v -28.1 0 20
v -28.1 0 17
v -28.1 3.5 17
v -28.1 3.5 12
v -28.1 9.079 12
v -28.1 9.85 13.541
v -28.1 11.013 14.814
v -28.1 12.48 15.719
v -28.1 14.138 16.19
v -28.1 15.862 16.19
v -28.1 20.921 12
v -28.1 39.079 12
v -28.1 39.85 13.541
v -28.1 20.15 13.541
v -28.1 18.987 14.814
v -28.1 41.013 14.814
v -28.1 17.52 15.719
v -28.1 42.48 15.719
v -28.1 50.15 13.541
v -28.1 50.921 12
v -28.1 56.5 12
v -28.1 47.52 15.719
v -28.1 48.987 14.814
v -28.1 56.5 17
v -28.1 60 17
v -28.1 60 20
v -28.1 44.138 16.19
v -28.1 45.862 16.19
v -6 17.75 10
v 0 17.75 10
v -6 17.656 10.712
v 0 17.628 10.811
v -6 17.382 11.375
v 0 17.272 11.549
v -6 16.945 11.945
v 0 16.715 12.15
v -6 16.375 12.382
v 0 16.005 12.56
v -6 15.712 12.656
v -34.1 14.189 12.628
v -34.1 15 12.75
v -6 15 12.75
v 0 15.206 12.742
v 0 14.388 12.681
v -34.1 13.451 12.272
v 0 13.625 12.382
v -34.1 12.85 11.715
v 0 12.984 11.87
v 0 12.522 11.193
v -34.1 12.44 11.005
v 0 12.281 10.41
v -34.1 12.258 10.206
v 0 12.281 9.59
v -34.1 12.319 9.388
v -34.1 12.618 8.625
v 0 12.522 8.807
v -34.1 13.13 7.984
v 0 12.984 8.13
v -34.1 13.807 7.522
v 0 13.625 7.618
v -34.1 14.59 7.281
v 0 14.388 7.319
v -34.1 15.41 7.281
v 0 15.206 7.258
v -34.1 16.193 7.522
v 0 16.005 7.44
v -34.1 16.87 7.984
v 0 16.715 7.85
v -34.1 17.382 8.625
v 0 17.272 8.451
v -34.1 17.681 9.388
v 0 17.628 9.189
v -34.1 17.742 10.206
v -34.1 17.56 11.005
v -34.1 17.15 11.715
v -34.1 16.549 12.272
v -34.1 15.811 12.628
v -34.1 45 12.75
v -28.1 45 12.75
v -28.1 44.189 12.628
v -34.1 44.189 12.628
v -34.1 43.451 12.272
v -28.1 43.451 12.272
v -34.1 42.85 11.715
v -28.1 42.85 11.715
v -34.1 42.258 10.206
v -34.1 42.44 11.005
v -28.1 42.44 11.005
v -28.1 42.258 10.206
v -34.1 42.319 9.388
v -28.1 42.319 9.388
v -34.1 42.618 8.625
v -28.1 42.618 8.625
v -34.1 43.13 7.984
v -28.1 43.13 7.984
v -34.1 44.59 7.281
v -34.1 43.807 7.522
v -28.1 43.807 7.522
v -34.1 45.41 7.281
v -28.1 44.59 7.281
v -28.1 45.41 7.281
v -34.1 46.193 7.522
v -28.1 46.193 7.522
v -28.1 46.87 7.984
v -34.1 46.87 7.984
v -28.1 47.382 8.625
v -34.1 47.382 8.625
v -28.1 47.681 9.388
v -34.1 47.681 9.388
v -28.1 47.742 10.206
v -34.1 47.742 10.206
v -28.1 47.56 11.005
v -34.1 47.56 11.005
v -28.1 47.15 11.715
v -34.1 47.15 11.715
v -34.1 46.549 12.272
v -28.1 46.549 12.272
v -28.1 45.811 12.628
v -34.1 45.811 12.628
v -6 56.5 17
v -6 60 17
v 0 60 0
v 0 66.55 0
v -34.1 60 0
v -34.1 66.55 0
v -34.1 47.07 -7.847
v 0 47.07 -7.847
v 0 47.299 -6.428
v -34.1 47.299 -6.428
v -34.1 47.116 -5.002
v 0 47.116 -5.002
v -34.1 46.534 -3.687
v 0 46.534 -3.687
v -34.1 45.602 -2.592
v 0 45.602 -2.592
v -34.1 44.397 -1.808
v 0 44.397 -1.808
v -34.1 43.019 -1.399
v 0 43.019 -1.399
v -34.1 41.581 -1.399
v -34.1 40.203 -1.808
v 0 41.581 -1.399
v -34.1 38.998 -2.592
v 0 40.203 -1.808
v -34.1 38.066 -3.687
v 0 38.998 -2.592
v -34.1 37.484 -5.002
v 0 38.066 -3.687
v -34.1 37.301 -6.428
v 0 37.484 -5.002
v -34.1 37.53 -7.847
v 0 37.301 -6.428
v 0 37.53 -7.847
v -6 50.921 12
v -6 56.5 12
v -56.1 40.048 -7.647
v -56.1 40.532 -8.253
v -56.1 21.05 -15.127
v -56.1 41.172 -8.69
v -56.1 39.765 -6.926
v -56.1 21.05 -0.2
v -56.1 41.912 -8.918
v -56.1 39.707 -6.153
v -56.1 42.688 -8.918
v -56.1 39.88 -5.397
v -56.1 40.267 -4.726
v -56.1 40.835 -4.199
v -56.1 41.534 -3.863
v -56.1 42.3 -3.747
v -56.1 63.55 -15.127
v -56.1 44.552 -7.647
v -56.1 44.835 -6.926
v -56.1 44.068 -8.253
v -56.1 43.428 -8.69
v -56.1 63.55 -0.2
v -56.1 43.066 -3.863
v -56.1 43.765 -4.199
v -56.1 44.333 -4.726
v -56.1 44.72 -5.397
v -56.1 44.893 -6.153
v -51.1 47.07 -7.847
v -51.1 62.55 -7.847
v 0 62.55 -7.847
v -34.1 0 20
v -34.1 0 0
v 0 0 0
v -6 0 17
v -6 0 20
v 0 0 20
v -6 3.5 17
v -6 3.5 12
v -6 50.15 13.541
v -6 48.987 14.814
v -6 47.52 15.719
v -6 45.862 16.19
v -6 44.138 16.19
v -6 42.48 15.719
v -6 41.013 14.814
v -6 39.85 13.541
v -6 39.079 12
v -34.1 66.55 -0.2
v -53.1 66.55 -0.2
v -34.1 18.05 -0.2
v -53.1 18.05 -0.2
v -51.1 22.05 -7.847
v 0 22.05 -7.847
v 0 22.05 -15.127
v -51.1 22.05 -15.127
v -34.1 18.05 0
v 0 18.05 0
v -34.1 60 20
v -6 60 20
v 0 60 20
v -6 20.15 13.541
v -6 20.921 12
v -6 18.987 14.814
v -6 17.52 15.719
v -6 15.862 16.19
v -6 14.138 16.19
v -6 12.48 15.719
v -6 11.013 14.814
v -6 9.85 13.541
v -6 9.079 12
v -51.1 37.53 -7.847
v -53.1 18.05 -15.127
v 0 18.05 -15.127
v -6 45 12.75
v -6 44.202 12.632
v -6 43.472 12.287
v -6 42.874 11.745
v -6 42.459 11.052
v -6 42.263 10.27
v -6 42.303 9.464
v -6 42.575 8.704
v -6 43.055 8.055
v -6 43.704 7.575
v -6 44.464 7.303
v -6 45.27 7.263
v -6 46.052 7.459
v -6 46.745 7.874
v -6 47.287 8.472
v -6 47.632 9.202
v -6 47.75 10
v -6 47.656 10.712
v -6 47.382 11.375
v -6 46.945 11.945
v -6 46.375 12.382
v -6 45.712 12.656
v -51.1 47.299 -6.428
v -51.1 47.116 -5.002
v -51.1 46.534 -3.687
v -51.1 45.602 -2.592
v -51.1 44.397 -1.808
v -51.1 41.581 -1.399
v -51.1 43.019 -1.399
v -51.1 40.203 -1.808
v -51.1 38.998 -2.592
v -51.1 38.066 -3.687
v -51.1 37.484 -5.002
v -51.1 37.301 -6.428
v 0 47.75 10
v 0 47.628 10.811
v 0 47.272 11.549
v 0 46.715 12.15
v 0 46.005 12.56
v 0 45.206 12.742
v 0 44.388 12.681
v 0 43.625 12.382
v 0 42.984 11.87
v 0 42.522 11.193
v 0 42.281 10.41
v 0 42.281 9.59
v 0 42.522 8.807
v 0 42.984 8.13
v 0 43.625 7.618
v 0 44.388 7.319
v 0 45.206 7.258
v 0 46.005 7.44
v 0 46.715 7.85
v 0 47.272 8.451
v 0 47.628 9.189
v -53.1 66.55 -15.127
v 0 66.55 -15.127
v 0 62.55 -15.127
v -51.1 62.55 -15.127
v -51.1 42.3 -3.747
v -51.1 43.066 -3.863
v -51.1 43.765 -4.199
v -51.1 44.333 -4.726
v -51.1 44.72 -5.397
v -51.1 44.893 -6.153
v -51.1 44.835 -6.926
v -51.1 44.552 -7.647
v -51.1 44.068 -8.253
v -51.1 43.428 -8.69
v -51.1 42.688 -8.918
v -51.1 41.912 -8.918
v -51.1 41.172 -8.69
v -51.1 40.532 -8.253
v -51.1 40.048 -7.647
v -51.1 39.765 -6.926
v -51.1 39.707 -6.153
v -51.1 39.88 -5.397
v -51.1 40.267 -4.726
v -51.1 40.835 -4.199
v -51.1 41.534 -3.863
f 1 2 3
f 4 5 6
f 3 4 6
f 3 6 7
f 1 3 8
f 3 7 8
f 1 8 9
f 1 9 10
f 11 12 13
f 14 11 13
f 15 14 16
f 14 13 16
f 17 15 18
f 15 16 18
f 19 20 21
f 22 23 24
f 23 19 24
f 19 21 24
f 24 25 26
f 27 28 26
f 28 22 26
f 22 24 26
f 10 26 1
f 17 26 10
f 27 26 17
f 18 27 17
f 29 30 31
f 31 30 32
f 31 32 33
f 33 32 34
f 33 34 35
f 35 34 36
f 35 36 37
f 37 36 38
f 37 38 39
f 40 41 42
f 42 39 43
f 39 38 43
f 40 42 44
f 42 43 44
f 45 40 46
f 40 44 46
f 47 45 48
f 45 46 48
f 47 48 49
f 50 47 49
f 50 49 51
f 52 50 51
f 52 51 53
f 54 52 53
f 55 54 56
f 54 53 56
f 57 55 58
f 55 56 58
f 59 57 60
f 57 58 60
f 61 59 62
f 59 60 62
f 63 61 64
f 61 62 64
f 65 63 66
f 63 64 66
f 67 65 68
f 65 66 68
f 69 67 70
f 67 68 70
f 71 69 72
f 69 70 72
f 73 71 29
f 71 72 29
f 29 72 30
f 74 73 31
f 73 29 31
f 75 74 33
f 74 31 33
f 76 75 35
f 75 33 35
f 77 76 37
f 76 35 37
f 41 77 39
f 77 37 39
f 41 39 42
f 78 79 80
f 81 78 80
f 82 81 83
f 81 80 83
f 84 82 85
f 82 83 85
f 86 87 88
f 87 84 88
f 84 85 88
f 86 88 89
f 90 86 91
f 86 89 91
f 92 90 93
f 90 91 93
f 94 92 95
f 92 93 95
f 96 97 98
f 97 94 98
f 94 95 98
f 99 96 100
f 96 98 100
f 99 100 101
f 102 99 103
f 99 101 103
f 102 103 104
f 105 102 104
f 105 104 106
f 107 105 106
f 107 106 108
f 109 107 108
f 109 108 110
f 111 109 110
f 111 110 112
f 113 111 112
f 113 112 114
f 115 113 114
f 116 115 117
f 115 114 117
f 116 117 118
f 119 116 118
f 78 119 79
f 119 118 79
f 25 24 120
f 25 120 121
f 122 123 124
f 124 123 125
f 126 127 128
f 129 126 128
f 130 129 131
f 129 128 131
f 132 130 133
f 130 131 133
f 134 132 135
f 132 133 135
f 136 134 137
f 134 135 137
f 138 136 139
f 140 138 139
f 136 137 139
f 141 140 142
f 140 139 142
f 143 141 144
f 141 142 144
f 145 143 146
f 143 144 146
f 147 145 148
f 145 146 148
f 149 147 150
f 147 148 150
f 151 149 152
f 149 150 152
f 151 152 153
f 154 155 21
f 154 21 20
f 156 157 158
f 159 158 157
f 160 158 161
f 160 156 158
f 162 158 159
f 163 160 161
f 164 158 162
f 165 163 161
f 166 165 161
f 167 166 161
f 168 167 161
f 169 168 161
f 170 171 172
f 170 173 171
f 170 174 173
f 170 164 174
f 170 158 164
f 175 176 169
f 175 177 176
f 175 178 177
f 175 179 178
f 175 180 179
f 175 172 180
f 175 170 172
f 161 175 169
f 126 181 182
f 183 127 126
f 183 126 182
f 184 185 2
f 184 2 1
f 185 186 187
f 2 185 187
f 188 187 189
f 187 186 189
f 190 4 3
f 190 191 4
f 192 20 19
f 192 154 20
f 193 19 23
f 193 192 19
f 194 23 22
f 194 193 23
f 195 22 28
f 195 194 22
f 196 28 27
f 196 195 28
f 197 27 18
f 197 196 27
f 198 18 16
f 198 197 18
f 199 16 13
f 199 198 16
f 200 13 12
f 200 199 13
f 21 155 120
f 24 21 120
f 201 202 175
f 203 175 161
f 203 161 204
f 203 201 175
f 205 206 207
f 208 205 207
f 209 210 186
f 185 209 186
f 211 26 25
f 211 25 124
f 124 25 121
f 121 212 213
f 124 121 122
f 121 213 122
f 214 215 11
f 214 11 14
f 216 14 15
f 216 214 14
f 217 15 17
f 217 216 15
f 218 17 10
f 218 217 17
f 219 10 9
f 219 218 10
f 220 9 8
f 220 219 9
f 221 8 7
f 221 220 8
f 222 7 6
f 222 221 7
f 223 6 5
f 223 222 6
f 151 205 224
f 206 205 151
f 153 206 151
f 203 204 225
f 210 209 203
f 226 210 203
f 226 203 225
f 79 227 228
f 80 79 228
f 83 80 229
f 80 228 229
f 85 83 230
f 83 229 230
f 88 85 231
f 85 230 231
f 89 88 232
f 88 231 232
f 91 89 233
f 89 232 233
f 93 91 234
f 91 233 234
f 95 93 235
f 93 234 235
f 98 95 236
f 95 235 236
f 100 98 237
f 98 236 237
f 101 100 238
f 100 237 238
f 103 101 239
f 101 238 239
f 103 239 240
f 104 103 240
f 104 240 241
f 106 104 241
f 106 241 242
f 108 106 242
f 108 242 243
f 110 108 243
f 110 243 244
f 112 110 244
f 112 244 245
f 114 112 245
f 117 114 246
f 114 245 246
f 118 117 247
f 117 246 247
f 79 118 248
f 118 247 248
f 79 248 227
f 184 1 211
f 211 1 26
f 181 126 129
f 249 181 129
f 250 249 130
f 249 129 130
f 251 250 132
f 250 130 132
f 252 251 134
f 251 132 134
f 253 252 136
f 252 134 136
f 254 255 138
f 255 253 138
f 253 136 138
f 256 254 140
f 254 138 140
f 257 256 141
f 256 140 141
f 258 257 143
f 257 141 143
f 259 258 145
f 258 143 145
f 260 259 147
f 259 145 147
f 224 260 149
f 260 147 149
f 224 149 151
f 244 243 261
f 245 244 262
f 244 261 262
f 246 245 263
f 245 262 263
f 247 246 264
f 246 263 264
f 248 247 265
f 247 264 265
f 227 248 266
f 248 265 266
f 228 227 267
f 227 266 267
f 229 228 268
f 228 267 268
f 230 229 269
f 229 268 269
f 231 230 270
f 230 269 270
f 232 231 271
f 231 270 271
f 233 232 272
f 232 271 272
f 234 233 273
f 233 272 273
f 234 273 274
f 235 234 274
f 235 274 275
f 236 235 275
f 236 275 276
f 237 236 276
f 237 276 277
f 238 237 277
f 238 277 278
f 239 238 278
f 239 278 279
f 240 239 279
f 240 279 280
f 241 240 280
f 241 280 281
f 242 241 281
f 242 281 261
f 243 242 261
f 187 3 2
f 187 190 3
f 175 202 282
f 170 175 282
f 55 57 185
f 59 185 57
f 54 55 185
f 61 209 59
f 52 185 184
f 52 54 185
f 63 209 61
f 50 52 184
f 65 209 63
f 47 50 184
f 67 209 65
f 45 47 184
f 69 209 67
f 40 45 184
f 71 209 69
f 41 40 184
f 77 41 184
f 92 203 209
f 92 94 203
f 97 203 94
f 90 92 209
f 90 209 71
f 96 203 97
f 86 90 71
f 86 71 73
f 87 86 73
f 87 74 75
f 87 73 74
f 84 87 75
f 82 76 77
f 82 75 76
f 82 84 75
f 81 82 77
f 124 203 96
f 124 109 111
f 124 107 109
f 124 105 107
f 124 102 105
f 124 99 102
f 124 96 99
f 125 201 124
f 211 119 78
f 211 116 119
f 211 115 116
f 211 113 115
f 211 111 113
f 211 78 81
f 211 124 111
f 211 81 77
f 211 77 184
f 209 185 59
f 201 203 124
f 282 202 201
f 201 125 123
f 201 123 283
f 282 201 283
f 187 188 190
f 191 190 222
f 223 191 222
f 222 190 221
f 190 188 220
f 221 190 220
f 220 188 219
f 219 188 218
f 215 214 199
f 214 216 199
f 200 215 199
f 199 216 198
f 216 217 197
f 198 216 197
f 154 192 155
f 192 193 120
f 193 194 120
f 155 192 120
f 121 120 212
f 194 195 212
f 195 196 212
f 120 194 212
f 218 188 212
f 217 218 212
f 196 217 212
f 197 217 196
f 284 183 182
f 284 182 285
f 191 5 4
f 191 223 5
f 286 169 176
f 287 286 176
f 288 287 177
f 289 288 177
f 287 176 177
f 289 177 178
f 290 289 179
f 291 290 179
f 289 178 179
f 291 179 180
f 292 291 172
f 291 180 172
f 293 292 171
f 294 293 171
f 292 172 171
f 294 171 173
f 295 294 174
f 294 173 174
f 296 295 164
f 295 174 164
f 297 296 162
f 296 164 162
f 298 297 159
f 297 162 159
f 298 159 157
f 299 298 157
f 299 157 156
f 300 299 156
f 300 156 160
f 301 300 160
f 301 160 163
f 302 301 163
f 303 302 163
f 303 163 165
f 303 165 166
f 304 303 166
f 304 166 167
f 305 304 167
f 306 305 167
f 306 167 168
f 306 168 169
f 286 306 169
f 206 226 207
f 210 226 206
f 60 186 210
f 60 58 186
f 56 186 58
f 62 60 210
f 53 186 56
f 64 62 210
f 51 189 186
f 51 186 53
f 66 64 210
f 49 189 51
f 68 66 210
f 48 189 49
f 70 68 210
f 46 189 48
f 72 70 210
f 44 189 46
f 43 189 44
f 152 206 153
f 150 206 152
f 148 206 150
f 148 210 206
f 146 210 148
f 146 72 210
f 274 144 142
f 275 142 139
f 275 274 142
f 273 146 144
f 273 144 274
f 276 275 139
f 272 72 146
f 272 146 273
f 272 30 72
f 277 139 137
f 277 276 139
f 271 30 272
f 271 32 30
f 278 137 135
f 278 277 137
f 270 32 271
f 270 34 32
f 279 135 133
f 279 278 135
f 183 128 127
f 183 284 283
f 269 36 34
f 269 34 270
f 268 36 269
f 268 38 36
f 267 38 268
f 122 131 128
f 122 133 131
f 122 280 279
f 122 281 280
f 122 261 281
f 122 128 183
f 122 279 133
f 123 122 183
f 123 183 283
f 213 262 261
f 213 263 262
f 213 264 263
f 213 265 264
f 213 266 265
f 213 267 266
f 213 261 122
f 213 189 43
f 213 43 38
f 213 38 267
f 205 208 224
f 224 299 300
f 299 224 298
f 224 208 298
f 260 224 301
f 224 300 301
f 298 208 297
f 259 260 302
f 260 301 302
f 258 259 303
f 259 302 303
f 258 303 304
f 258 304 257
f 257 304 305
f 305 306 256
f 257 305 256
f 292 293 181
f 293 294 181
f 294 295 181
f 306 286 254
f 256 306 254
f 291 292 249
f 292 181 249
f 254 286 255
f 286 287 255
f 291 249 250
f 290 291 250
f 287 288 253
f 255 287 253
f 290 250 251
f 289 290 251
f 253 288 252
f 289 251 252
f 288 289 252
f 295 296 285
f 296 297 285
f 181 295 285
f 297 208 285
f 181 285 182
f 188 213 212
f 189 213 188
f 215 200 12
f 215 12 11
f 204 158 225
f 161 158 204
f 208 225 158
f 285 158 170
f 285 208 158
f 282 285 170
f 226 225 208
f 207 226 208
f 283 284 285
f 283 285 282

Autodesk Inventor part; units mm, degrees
ref_plane "YZ Plane" through (0, 0, 0) normal (1, 0, 0) x (0, 1, 0)
ref_plane "XZ Plane" through (0, 0, 0) normal (0, 1, 0) x (-1, 0, 0)
ref_plane "XY Plane" through (0, 0, 0) normal (0, 0, 1) x (1, 0, 0)
sketch "Sketch1" plane through (0, 0, 0) normal (1, 0, 0) x (0, 1, 0)
  line L0 (0, 0) -> (60, 0)
  line L1 (60, 0) -> (60, 20)
  line L2 (60, 20) -> (0, 20)
  line L3 (0, 20) -> (0, 0)
  line L4 (60, 10) -> (0, 10) construction
  line L5 (60, 10) -> (30, 10) construction
  line L6 (30, 10) -> (0, 10) construction
  circle A0 centre (45, 10) radius 2.75
  circle A1 centre (15, 10) radius 2.75
  dimension "d0" = 60
  dimension "d1" = 20
  dimension "d2" = 5.5
  dimension "d3" = 5.5
extrude "Extrusion1" add sketch "Sketch1" against normal blind 6
sketch "Sketch2" plane through (-6, 0, 0) normal (-1, 0, 0) x (0, 0, 1)
  circle A0 centre (10, 45) radius 2.75 projected
  circle A1 centre (10, 15) radius 2.75 projected
  circle A2 centre (10, 45) radius 6.25
  circle A3 centre (10, 15) radius 6.25
  line L0 (20, 60) -> (0, 60) projected
  line L1 (12, 60) -> (12, 0)
  line L2 (8, 60) -> (8, 0)
  line L3 (0, 0) -> (20, 0) projected
  line L4 (0, 60) -> (0, 0) projected
  line L5 (20, 0) -> (20, 60) projected
  line L6 (12, 56.5) -> (17, 56.5)
  line L7 (17, 56.5) -> (17, 60)
  line L8 (8, 56.5) -> (3, 56.5)
  line L9 (3, 56.5) -> (3, 60)
  line L10 (8, 3.5) -> (3, 3.5)
  line L11 (3, 3.5) -> (3, 0)
  line L12 (12, 3.5) -> (17, 3.5)
  line L13 (17, 3.5) -> (17, 0)
  point P0 (12, 39.0786)
  point P1 (12, 50.9214)
  point P2 (8, 50.9214)
  point P3 (8, 39.0786)
  point P4 (8, 20.9214)
  point P5 (8, 9.0786)
  point P6 (12, 9.0786)
  point P7 (12, 20.9214)
  dimension "d6" = 3.5
  dimension "d7" = 8
  dimension "d8" = 8
  dimension "d9" = 3.5
  dimension "d10" = 3.5
  dimension "d11" = 3.5
  dimension "d16" = 3.5
extrude "Extrusion2" add sketch "Sketch2" along normal blind 22.1 contours A0 L1 A2 | A0 L2 A2 L1 | L1 A2 L2 A0 | A0 L2 A2 | A2 L2 L0 L1 | L1 A3 L2 A2 | A2 L2 A3 L10 L11 L3 L4 L0 L9 L8 | L1 L0 L7 L6 | L1 A1 L2 A3 | A3 L1 A1 | L8 L9 L0 L2 | L2 A1 A3 | L2 A1 L1 A3 | A3 L1 L3 L2 | L2 L3 L11 L10 | L12 L13 L3 L1
sketch "Sketch3" plane through (-28.1, 0, 0) normal (-1, 0, 0) x (0, 0, 1)
  circle A0 centre (10, 45) radius 2.75 projected
  circle A1 centre (10, 15) radius 2.75 projected
  line L0 (20, 0) -> (20, 60) projected
  line L1 (0, 0) -> (20, 0) projected
  line L2 (0, 0) -> (20, 0) projected
  line L3 (0, 0) -> (20, 0) projected
  line L4 (0, 60) -> (0, 0) projected
  line L5 (20, 60) -> (17, 60) projected
  line L6 (20, 60) -> (0, 60) projected
  line L7 (20, 60) -> (17, 60) projected
  point P0 (17, 0)
  point P1 (3, 0)
  point P2 (3, 60)
extrude "Extrusion3" add sketch "Sketch3" along normal blind 6
sketch "Sketch4" plane through (0, 0, 0) normal (0, 0, -1) x (-1, 0, 0)
  line L0 (0, 60) -> (0, 0) projected
  line L1 (34.1, 60) -> (34.1, 0) projected
  line L2 (0, 60) -> (34.1, 60)
  line L3 (34.1, 60) -> (34.1, 24.6)
  line L4 (34.1, 24.6) -> (0, 24.6)
  line L5 (0, 24.6) -> (0, 60)
  line L6 (34.1, 0) -> (34.1, 60) projected
  line L7 (0, 0) -> (0, 60) projected
  line L8 (34.1, 62.55) -> (0, 62.55)
  line L9 (0, 62.55) -> (0, 22.05)
  line L10 (0, 22.05) -> (34.1, 22.05)
  line L11 (34.1, 22.05) -> (34.1, 62.55)
  line L12 (0, 66.55) -> (34.1, 66.55)
  line L13 (34.1, 18.05) -> (0, 18.05)
  line L14 (2.6912, 62.55) -> (2.6912, 22.05) construction
  line L15 (34.1, 62.55) -> (34.1, 66.55)
  line L16 (0, 62.55) -> (0, 66.55)
  point P0 (34.1, 54.55)
  point P1 (0, 54.55)
  point P2 (2.6912, 42.3)
  dimension "d17" = 35.4
  dimension "d18" = 40.5
  dimension "d20" = 4
  dimension "d45" = 17.7
  dimension "d46" = 4
extrude "Extrusion4" add sketch "Sketch4" along normal blind 7.847
sketch "Sketch5" plane through (0, 0, -7.847) normal (0, 0, -1) x (-1, 0, 0)
  line L0 (34.1, 18.05) -> (34.1, 66.55) projected
  line L1 (34.1, 66.55) -> (0, 66.55) projected
  line L2 (0, 66.55) -> (0, 18.05) projected
  line L3 (0, 18.05) -> (34.1, 18.05) projected
  line L4 (34.1, 18.05) -> (34.1, 54.55) projected
  line L5 (0, 54.55) -> (0, 18.05) projected
  line L6 (34.1, 62.55) -> (0, 62.55)
  line L7 (0, 62.55) -> (0, 22.05)
  line L8 (0, 22.05) -> (34.1, 22.05)
  line L9 (34.1, 22.05) -> (34.1, 62.55)
  point P0 (0, 0)
  point P1 (0, 62.55)
  point P2 (34.1, 22.05)
  dimension "d23" = 40.5
  dimension "d24" = 4
extrude "Extrusion5" add sketch "Sketch5" along normal blind 7.28 contours L3 L2 L8 L0 | L6 L2 L1 L0
sketch "Sketch6" plane through (0, 0, 0) normal (1, 0, 0) x (0, 0, -1)
  line L0 (7.847, 22.05) -> (15.127, 22.05) construction
  line L1 (7.847, 62.55) -> (15.127, 62.55) construction
  line L2 (7.847, 22.05) -> (10.847, 22.05) construction
  line L3 (10.847, 22.05) -> (10.847, 62.55) construction
  line L4 (10.847, 62.55) -> (7.847, 62.55) construction
  line L5 (7.847, 62.55) -> (7.847, 22.05) construction
  line L6 (7.847, 22.05) -> (7.847, 62.55) construction
  line L7 (7.847, 42.3) -> (1.4795, 42.3) construction
  circle A0 centre (6.347, 42.3) radius 2.5 construction
  circle A1 centre (6.347, 42.3) radius 4.5
  line L8 (0, 60) -> (-20, 60) projected
  line L9 (-20, 60) -> (-20, 0) projected
  line L10 (-20, 0) -> (0, 0) projected
  line L11 (0, 0) -> (0, 18.05) projected
  circle A2 centre (-10, 45) radius 2.75 projected
  circle A3 centre (-10, 15) radius 2.75 projected
  circle A4 centre (6.347, 42.3) radius 5
  line L12 (0, 18.05) -> (15.127, 18.05) projected
  line L13 (15.127, 22.05) -> (15.127, 18.05) projected
  line L14 (7.847, 22.05) -> (15.127, 22.05) projected
  line L15 (7.847, 62.55) -> (7.847, 22.05) projected
  line L16 (7.847, 62.55) -> (15.127, 62.55) projected
  line L17 (15.127, 66.55) -> (15.127, 62.55) projected
  line L18 (0, 66.55) -> (15.127, 66.55) projected
  line L19 (0, 66.55) -> (0, 60) projected
  point P0 (7.847, 47.0697)
  point P1 (7.847, 37.5303)
  dimension "d27" = 3
  dimension "d28" = 5
  dimension "d29" = 2
  dimension "d30" = 2
  dimension "d31" = 0.5
extrude "Extrusion6" cut sketch "Sketch6" against normal through all contours L15 A1 | A1 L15 A4 picked at (4.8498, 43.4746) picked at (1.5593, 41.9128)
sketch "Sketch8" plane through (-34.1, 0, 0) normal (-1, 0, 0) x (0, 0, 1)
  line L0 (0, 18.05) -> (0, 0) projected
  line L1 (0, 0) -> (20, 0) projected
  line L2 (20, 0) -> (20, 60) projected
  line L3 (20, 60) -> (0, 60) projected
  circle A0 centre (10, 45) radius 2.75 projected
  circle A1 centre (10, 15) radius 2.75 projected
  line L4 (-0.2, 66.55) -> (-0.2, 18.05)
  line L5 (0, 18.05) -> (-15.127, 18.05) projected
  line L6 (0, 60) -> (0, 66.55) projected
  line L7 (0, 66.55) -> (-15.127, 66.55) projected
  line L8 (-15.127, 62.55) -> (-15.127, 66.55) projected
  line L9 (-7.847, 62.55) -> (-15.127, 62.55) projected
  line L10 (-7.847, 22.05) -> (-7.847, 37.5303) projected
  line L11 (-7.847, 22.05) -> (-15.127, 22.05) projected
  line L12 (-15.127, 18.05) -> (-15.127, 22.05) projected
  line L13 (0, 18.05) -> (-15.127, 18.05) projected
  arc A2 (-7.847, 37.5303) -> (-7.847, 47.0697) centre (-6.347, 42.3) ccw projected
  arc A3 (-7.847, 37.5303) -> (-7.847, 47.0697) centre (-6.347, 42.3) ccw projected
  line L14 (-7.847, 47.0697) -> (-7.847, 62.55) projected
  dimension "d34" = 0.2
extrude "Extrusion7" add sketch "Sketch8" along normal blind 17 contours L5 L12 L11 L10 A2 L14 L9 L8 L7 L4
sketch "Sketch9" plane through (-51.1, 0, 0) normal (-1, 0, 0) x (0, 0, 1)
  line L0 (-15.127, 22.05) -> (-15.127, 18.05) projected
  line L1 (-0.2, 18.05) -> (-0.2, 66.55) projected
  line L2 (-15.127, 22.05) -> (-15.127, 18.05) projected
  line L3 (-15.127, 18.05) -> (-15.127, 62.55)
  line L4 (-15.127, 62.55) -> (-7.847, 62.55) projected
  line L5 (-7.847, 37.5303) -> (-7.847, 22.05) projected
  line L6 (-7.847, 22.05) -> (-15.127, 22.05) projected
  line L7 (-15.127, 18.05) -> (-0.2, 18.05) projected
  line L8 (-0.2, 66.55) -> (-15.127, 66.55) projected
  line L9 (-15.127, 66.55) -> (-15.127, 62.55) projected
  arc A0 (-7.847, 37.5303) -> (-7.847, 47.0697) centre (-6.347, 42.3) ccw projected
  line L10 (-7.847, 62.55) -> (-7.847, 47.0697) projected
  point P0 (0, 0)
  point P1 (-15.127, 22.05)
extrude "Extrusion8" add sketch "Sketch9" along normal blind 5
sketch "Sketch10" plane through (-56.1, 0, 0) normal (-1, 0, 0) x (0, 0, 1)
  arc A0 (-7.847, 37.5303) -> (-7.847, 47.0697) centre (-6.347, 42.3) ccw projected
  circle A1 centre (-6.347, 42.3) radius 2.6
  point P0 (0, 0)
  dimension "d39" = 5.2
extrude "Extrusion9" cut sketch "Sketch10" against normal up to next
chamfer "Chamfer1" distance 3 angle 45 2 edges at (-56.1, 66.55, -7.6635) (-56.1, 18.05, -7.6635)
equation "\"d3\" = d2"
equation "\"d16\" = d6"
equation "\"d46\" = d20"
properties part number "Y Axis Belt Adjustable and Plate Spacer"
